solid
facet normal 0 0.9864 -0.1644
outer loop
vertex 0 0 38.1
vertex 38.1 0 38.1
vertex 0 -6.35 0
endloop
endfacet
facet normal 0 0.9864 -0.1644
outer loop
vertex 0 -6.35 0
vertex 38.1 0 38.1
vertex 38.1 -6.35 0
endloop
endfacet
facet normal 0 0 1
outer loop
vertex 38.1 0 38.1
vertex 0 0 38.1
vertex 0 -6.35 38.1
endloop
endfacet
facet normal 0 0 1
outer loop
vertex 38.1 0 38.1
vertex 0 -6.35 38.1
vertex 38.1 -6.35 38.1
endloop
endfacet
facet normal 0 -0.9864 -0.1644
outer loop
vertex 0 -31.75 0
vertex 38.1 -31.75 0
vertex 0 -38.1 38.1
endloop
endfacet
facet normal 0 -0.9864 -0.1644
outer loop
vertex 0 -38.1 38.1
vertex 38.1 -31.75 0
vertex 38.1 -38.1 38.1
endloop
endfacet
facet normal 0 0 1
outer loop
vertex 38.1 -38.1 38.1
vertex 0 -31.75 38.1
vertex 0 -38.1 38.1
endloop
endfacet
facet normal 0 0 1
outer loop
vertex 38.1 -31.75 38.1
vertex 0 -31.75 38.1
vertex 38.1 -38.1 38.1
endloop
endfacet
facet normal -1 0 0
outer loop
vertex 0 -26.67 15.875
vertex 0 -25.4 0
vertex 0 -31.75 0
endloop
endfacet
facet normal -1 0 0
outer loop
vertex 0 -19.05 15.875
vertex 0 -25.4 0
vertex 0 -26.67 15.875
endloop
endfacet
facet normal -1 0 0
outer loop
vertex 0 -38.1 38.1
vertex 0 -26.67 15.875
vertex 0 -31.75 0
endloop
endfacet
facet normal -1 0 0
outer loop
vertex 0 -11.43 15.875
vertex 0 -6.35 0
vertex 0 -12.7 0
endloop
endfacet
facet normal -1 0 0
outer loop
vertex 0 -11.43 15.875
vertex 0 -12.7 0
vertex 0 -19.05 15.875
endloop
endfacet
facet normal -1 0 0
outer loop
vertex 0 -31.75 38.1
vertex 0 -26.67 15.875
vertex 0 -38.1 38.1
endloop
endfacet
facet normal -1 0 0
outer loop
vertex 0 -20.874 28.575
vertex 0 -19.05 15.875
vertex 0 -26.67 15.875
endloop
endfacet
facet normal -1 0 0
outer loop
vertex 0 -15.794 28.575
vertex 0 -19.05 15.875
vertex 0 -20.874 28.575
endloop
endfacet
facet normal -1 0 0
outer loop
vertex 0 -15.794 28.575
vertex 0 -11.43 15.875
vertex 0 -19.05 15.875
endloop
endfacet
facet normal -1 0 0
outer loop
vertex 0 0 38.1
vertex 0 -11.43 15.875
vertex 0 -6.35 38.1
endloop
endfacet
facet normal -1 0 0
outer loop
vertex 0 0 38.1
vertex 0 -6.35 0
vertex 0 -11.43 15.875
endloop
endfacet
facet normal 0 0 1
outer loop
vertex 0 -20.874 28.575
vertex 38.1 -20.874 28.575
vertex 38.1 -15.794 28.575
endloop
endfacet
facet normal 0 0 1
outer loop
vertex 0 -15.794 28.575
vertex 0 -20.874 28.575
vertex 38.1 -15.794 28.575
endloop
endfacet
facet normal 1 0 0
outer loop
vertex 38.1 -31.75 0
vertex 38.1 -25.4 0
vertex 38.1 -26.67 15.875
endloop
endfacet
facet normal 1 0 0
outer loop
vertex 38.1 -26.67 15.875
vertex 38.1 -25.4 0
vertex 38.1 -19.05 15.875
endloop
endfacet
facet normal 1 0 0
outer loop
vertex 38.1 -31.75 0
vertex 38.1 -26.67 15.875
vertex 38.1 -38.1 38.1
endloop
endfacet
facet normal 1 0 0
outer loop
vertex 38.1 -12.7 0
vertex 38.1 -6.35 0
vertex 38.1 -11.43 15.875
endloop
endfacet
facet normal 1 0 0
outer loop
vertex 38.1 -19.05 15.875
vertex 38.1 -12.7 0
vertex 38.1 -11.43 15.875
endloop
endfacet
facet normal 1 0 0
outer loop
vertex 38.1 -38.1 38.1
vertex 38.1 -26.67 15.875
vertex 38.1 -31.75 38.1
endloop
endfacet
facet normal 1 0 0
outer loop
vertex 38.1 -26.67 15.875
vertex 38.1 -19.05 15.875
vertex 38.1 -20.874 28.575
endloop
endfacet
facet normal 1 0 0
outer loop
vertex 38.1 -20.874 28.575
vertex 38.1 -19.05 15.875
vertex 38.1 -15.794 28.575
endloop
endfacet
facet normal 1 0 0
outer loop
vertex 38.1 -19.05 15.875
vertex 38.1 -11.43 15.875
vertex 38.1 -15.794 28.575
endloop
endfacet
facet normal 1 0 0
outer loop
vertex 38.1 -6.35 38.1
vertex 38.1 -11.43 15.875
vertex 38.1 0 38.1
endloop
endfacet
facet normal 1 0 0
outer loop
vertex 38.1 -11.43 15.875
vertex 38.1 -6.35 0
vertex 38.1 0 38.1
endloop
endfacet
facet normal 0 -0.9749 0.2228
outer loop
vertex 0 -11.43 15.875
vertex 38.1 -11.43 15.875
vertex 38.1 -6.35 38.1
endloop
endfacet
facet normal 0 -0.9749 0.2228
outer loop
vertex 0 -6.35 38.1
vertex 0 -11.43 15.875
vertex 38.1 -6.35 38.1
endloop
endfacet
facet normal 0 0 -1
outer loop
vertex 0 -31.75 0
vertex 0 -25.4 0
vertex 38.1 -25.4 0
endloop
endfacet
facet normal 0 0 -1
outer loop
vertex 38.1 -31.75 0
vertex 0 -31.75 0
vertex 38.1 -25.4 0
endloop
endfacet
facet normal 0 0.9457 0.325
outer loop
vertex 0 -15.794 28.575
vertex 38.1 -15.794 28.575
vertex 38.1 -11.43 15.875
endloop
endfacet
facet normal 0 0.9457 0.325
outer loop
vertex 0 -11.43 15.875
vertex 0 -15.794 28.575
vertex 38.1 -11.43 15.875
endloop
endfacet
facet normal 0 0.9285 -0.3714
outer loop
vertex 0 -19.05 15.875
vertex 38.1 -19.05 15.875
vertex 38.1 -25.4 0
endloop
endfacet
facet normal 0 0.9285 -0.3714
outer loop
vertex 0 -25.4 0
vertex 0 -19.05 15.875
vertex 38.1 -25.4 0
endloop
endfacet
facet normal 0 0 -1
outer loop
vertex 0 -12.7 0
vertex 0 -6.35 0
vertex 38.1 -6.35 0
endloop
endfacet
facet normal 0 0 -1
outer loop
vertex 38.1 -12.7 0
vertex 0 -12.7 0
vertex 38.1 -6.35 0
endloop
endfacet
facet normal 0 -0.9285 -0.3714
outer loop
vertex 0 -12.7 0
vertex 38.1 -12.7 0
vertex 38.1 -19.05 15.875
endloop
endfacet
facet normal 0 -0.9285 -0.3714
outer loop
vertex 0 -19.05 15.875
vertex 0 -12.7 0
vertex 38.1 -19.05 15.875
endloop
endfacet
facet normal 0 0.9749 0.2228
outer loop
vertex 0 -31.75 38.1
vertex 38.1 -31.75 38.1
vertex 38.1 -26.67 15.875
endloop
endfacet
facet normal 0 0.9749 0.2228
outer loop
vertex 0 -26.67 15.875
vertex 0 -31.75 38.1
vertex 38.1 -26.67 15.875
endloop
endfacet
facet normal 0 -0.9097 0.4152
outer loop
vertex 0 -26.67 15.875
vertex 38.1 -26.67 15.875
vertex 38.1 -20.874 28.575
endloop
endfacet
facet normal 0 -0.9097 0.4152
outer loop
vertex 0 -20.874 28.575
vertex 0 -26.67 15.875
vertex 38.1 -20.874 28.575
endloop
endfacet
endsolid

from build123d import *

# Parameters (mm, degrees)
F0_W     = 38.1
F0_H     = 38.1
F1_DEPTH = 38.1
F5_DEPTH = 38.1


with BuildPart() as f1:
    # F0 (on Front) → F1 (new body)
    with BuildSketch(Plane.XZ):
        with Locations((19.05, 19.05)):
            Rectangle(F0_W, F0_H)
    extrude(amount=F1_DEPTH)

    # F4 (on offset) → F5 (cut)
    with BuildSketch(Plane.YZ.offset(38.1)):
        Polygon((-11.43, 15.875), (-6.35, 38.1), (-31.75, 38.1), (-26.67, 15.875), (-20.874323, 28.575), (-15.794323, 28.575), align=None)
        Polygon((-31.75, 0), (-38.1, 38.1), (-38.1, 0), align=None)
        Polygon((-25.4, 0), (-12.7, 0), (-19.05, 15.875), align=None)
        Polygon((-6.35, 0), (0, 0), (0, 38.1), align=None)
    extrude(amount=-F5_DEPTH, mode=Mode.SUBTRACT)


solid = f1.part
